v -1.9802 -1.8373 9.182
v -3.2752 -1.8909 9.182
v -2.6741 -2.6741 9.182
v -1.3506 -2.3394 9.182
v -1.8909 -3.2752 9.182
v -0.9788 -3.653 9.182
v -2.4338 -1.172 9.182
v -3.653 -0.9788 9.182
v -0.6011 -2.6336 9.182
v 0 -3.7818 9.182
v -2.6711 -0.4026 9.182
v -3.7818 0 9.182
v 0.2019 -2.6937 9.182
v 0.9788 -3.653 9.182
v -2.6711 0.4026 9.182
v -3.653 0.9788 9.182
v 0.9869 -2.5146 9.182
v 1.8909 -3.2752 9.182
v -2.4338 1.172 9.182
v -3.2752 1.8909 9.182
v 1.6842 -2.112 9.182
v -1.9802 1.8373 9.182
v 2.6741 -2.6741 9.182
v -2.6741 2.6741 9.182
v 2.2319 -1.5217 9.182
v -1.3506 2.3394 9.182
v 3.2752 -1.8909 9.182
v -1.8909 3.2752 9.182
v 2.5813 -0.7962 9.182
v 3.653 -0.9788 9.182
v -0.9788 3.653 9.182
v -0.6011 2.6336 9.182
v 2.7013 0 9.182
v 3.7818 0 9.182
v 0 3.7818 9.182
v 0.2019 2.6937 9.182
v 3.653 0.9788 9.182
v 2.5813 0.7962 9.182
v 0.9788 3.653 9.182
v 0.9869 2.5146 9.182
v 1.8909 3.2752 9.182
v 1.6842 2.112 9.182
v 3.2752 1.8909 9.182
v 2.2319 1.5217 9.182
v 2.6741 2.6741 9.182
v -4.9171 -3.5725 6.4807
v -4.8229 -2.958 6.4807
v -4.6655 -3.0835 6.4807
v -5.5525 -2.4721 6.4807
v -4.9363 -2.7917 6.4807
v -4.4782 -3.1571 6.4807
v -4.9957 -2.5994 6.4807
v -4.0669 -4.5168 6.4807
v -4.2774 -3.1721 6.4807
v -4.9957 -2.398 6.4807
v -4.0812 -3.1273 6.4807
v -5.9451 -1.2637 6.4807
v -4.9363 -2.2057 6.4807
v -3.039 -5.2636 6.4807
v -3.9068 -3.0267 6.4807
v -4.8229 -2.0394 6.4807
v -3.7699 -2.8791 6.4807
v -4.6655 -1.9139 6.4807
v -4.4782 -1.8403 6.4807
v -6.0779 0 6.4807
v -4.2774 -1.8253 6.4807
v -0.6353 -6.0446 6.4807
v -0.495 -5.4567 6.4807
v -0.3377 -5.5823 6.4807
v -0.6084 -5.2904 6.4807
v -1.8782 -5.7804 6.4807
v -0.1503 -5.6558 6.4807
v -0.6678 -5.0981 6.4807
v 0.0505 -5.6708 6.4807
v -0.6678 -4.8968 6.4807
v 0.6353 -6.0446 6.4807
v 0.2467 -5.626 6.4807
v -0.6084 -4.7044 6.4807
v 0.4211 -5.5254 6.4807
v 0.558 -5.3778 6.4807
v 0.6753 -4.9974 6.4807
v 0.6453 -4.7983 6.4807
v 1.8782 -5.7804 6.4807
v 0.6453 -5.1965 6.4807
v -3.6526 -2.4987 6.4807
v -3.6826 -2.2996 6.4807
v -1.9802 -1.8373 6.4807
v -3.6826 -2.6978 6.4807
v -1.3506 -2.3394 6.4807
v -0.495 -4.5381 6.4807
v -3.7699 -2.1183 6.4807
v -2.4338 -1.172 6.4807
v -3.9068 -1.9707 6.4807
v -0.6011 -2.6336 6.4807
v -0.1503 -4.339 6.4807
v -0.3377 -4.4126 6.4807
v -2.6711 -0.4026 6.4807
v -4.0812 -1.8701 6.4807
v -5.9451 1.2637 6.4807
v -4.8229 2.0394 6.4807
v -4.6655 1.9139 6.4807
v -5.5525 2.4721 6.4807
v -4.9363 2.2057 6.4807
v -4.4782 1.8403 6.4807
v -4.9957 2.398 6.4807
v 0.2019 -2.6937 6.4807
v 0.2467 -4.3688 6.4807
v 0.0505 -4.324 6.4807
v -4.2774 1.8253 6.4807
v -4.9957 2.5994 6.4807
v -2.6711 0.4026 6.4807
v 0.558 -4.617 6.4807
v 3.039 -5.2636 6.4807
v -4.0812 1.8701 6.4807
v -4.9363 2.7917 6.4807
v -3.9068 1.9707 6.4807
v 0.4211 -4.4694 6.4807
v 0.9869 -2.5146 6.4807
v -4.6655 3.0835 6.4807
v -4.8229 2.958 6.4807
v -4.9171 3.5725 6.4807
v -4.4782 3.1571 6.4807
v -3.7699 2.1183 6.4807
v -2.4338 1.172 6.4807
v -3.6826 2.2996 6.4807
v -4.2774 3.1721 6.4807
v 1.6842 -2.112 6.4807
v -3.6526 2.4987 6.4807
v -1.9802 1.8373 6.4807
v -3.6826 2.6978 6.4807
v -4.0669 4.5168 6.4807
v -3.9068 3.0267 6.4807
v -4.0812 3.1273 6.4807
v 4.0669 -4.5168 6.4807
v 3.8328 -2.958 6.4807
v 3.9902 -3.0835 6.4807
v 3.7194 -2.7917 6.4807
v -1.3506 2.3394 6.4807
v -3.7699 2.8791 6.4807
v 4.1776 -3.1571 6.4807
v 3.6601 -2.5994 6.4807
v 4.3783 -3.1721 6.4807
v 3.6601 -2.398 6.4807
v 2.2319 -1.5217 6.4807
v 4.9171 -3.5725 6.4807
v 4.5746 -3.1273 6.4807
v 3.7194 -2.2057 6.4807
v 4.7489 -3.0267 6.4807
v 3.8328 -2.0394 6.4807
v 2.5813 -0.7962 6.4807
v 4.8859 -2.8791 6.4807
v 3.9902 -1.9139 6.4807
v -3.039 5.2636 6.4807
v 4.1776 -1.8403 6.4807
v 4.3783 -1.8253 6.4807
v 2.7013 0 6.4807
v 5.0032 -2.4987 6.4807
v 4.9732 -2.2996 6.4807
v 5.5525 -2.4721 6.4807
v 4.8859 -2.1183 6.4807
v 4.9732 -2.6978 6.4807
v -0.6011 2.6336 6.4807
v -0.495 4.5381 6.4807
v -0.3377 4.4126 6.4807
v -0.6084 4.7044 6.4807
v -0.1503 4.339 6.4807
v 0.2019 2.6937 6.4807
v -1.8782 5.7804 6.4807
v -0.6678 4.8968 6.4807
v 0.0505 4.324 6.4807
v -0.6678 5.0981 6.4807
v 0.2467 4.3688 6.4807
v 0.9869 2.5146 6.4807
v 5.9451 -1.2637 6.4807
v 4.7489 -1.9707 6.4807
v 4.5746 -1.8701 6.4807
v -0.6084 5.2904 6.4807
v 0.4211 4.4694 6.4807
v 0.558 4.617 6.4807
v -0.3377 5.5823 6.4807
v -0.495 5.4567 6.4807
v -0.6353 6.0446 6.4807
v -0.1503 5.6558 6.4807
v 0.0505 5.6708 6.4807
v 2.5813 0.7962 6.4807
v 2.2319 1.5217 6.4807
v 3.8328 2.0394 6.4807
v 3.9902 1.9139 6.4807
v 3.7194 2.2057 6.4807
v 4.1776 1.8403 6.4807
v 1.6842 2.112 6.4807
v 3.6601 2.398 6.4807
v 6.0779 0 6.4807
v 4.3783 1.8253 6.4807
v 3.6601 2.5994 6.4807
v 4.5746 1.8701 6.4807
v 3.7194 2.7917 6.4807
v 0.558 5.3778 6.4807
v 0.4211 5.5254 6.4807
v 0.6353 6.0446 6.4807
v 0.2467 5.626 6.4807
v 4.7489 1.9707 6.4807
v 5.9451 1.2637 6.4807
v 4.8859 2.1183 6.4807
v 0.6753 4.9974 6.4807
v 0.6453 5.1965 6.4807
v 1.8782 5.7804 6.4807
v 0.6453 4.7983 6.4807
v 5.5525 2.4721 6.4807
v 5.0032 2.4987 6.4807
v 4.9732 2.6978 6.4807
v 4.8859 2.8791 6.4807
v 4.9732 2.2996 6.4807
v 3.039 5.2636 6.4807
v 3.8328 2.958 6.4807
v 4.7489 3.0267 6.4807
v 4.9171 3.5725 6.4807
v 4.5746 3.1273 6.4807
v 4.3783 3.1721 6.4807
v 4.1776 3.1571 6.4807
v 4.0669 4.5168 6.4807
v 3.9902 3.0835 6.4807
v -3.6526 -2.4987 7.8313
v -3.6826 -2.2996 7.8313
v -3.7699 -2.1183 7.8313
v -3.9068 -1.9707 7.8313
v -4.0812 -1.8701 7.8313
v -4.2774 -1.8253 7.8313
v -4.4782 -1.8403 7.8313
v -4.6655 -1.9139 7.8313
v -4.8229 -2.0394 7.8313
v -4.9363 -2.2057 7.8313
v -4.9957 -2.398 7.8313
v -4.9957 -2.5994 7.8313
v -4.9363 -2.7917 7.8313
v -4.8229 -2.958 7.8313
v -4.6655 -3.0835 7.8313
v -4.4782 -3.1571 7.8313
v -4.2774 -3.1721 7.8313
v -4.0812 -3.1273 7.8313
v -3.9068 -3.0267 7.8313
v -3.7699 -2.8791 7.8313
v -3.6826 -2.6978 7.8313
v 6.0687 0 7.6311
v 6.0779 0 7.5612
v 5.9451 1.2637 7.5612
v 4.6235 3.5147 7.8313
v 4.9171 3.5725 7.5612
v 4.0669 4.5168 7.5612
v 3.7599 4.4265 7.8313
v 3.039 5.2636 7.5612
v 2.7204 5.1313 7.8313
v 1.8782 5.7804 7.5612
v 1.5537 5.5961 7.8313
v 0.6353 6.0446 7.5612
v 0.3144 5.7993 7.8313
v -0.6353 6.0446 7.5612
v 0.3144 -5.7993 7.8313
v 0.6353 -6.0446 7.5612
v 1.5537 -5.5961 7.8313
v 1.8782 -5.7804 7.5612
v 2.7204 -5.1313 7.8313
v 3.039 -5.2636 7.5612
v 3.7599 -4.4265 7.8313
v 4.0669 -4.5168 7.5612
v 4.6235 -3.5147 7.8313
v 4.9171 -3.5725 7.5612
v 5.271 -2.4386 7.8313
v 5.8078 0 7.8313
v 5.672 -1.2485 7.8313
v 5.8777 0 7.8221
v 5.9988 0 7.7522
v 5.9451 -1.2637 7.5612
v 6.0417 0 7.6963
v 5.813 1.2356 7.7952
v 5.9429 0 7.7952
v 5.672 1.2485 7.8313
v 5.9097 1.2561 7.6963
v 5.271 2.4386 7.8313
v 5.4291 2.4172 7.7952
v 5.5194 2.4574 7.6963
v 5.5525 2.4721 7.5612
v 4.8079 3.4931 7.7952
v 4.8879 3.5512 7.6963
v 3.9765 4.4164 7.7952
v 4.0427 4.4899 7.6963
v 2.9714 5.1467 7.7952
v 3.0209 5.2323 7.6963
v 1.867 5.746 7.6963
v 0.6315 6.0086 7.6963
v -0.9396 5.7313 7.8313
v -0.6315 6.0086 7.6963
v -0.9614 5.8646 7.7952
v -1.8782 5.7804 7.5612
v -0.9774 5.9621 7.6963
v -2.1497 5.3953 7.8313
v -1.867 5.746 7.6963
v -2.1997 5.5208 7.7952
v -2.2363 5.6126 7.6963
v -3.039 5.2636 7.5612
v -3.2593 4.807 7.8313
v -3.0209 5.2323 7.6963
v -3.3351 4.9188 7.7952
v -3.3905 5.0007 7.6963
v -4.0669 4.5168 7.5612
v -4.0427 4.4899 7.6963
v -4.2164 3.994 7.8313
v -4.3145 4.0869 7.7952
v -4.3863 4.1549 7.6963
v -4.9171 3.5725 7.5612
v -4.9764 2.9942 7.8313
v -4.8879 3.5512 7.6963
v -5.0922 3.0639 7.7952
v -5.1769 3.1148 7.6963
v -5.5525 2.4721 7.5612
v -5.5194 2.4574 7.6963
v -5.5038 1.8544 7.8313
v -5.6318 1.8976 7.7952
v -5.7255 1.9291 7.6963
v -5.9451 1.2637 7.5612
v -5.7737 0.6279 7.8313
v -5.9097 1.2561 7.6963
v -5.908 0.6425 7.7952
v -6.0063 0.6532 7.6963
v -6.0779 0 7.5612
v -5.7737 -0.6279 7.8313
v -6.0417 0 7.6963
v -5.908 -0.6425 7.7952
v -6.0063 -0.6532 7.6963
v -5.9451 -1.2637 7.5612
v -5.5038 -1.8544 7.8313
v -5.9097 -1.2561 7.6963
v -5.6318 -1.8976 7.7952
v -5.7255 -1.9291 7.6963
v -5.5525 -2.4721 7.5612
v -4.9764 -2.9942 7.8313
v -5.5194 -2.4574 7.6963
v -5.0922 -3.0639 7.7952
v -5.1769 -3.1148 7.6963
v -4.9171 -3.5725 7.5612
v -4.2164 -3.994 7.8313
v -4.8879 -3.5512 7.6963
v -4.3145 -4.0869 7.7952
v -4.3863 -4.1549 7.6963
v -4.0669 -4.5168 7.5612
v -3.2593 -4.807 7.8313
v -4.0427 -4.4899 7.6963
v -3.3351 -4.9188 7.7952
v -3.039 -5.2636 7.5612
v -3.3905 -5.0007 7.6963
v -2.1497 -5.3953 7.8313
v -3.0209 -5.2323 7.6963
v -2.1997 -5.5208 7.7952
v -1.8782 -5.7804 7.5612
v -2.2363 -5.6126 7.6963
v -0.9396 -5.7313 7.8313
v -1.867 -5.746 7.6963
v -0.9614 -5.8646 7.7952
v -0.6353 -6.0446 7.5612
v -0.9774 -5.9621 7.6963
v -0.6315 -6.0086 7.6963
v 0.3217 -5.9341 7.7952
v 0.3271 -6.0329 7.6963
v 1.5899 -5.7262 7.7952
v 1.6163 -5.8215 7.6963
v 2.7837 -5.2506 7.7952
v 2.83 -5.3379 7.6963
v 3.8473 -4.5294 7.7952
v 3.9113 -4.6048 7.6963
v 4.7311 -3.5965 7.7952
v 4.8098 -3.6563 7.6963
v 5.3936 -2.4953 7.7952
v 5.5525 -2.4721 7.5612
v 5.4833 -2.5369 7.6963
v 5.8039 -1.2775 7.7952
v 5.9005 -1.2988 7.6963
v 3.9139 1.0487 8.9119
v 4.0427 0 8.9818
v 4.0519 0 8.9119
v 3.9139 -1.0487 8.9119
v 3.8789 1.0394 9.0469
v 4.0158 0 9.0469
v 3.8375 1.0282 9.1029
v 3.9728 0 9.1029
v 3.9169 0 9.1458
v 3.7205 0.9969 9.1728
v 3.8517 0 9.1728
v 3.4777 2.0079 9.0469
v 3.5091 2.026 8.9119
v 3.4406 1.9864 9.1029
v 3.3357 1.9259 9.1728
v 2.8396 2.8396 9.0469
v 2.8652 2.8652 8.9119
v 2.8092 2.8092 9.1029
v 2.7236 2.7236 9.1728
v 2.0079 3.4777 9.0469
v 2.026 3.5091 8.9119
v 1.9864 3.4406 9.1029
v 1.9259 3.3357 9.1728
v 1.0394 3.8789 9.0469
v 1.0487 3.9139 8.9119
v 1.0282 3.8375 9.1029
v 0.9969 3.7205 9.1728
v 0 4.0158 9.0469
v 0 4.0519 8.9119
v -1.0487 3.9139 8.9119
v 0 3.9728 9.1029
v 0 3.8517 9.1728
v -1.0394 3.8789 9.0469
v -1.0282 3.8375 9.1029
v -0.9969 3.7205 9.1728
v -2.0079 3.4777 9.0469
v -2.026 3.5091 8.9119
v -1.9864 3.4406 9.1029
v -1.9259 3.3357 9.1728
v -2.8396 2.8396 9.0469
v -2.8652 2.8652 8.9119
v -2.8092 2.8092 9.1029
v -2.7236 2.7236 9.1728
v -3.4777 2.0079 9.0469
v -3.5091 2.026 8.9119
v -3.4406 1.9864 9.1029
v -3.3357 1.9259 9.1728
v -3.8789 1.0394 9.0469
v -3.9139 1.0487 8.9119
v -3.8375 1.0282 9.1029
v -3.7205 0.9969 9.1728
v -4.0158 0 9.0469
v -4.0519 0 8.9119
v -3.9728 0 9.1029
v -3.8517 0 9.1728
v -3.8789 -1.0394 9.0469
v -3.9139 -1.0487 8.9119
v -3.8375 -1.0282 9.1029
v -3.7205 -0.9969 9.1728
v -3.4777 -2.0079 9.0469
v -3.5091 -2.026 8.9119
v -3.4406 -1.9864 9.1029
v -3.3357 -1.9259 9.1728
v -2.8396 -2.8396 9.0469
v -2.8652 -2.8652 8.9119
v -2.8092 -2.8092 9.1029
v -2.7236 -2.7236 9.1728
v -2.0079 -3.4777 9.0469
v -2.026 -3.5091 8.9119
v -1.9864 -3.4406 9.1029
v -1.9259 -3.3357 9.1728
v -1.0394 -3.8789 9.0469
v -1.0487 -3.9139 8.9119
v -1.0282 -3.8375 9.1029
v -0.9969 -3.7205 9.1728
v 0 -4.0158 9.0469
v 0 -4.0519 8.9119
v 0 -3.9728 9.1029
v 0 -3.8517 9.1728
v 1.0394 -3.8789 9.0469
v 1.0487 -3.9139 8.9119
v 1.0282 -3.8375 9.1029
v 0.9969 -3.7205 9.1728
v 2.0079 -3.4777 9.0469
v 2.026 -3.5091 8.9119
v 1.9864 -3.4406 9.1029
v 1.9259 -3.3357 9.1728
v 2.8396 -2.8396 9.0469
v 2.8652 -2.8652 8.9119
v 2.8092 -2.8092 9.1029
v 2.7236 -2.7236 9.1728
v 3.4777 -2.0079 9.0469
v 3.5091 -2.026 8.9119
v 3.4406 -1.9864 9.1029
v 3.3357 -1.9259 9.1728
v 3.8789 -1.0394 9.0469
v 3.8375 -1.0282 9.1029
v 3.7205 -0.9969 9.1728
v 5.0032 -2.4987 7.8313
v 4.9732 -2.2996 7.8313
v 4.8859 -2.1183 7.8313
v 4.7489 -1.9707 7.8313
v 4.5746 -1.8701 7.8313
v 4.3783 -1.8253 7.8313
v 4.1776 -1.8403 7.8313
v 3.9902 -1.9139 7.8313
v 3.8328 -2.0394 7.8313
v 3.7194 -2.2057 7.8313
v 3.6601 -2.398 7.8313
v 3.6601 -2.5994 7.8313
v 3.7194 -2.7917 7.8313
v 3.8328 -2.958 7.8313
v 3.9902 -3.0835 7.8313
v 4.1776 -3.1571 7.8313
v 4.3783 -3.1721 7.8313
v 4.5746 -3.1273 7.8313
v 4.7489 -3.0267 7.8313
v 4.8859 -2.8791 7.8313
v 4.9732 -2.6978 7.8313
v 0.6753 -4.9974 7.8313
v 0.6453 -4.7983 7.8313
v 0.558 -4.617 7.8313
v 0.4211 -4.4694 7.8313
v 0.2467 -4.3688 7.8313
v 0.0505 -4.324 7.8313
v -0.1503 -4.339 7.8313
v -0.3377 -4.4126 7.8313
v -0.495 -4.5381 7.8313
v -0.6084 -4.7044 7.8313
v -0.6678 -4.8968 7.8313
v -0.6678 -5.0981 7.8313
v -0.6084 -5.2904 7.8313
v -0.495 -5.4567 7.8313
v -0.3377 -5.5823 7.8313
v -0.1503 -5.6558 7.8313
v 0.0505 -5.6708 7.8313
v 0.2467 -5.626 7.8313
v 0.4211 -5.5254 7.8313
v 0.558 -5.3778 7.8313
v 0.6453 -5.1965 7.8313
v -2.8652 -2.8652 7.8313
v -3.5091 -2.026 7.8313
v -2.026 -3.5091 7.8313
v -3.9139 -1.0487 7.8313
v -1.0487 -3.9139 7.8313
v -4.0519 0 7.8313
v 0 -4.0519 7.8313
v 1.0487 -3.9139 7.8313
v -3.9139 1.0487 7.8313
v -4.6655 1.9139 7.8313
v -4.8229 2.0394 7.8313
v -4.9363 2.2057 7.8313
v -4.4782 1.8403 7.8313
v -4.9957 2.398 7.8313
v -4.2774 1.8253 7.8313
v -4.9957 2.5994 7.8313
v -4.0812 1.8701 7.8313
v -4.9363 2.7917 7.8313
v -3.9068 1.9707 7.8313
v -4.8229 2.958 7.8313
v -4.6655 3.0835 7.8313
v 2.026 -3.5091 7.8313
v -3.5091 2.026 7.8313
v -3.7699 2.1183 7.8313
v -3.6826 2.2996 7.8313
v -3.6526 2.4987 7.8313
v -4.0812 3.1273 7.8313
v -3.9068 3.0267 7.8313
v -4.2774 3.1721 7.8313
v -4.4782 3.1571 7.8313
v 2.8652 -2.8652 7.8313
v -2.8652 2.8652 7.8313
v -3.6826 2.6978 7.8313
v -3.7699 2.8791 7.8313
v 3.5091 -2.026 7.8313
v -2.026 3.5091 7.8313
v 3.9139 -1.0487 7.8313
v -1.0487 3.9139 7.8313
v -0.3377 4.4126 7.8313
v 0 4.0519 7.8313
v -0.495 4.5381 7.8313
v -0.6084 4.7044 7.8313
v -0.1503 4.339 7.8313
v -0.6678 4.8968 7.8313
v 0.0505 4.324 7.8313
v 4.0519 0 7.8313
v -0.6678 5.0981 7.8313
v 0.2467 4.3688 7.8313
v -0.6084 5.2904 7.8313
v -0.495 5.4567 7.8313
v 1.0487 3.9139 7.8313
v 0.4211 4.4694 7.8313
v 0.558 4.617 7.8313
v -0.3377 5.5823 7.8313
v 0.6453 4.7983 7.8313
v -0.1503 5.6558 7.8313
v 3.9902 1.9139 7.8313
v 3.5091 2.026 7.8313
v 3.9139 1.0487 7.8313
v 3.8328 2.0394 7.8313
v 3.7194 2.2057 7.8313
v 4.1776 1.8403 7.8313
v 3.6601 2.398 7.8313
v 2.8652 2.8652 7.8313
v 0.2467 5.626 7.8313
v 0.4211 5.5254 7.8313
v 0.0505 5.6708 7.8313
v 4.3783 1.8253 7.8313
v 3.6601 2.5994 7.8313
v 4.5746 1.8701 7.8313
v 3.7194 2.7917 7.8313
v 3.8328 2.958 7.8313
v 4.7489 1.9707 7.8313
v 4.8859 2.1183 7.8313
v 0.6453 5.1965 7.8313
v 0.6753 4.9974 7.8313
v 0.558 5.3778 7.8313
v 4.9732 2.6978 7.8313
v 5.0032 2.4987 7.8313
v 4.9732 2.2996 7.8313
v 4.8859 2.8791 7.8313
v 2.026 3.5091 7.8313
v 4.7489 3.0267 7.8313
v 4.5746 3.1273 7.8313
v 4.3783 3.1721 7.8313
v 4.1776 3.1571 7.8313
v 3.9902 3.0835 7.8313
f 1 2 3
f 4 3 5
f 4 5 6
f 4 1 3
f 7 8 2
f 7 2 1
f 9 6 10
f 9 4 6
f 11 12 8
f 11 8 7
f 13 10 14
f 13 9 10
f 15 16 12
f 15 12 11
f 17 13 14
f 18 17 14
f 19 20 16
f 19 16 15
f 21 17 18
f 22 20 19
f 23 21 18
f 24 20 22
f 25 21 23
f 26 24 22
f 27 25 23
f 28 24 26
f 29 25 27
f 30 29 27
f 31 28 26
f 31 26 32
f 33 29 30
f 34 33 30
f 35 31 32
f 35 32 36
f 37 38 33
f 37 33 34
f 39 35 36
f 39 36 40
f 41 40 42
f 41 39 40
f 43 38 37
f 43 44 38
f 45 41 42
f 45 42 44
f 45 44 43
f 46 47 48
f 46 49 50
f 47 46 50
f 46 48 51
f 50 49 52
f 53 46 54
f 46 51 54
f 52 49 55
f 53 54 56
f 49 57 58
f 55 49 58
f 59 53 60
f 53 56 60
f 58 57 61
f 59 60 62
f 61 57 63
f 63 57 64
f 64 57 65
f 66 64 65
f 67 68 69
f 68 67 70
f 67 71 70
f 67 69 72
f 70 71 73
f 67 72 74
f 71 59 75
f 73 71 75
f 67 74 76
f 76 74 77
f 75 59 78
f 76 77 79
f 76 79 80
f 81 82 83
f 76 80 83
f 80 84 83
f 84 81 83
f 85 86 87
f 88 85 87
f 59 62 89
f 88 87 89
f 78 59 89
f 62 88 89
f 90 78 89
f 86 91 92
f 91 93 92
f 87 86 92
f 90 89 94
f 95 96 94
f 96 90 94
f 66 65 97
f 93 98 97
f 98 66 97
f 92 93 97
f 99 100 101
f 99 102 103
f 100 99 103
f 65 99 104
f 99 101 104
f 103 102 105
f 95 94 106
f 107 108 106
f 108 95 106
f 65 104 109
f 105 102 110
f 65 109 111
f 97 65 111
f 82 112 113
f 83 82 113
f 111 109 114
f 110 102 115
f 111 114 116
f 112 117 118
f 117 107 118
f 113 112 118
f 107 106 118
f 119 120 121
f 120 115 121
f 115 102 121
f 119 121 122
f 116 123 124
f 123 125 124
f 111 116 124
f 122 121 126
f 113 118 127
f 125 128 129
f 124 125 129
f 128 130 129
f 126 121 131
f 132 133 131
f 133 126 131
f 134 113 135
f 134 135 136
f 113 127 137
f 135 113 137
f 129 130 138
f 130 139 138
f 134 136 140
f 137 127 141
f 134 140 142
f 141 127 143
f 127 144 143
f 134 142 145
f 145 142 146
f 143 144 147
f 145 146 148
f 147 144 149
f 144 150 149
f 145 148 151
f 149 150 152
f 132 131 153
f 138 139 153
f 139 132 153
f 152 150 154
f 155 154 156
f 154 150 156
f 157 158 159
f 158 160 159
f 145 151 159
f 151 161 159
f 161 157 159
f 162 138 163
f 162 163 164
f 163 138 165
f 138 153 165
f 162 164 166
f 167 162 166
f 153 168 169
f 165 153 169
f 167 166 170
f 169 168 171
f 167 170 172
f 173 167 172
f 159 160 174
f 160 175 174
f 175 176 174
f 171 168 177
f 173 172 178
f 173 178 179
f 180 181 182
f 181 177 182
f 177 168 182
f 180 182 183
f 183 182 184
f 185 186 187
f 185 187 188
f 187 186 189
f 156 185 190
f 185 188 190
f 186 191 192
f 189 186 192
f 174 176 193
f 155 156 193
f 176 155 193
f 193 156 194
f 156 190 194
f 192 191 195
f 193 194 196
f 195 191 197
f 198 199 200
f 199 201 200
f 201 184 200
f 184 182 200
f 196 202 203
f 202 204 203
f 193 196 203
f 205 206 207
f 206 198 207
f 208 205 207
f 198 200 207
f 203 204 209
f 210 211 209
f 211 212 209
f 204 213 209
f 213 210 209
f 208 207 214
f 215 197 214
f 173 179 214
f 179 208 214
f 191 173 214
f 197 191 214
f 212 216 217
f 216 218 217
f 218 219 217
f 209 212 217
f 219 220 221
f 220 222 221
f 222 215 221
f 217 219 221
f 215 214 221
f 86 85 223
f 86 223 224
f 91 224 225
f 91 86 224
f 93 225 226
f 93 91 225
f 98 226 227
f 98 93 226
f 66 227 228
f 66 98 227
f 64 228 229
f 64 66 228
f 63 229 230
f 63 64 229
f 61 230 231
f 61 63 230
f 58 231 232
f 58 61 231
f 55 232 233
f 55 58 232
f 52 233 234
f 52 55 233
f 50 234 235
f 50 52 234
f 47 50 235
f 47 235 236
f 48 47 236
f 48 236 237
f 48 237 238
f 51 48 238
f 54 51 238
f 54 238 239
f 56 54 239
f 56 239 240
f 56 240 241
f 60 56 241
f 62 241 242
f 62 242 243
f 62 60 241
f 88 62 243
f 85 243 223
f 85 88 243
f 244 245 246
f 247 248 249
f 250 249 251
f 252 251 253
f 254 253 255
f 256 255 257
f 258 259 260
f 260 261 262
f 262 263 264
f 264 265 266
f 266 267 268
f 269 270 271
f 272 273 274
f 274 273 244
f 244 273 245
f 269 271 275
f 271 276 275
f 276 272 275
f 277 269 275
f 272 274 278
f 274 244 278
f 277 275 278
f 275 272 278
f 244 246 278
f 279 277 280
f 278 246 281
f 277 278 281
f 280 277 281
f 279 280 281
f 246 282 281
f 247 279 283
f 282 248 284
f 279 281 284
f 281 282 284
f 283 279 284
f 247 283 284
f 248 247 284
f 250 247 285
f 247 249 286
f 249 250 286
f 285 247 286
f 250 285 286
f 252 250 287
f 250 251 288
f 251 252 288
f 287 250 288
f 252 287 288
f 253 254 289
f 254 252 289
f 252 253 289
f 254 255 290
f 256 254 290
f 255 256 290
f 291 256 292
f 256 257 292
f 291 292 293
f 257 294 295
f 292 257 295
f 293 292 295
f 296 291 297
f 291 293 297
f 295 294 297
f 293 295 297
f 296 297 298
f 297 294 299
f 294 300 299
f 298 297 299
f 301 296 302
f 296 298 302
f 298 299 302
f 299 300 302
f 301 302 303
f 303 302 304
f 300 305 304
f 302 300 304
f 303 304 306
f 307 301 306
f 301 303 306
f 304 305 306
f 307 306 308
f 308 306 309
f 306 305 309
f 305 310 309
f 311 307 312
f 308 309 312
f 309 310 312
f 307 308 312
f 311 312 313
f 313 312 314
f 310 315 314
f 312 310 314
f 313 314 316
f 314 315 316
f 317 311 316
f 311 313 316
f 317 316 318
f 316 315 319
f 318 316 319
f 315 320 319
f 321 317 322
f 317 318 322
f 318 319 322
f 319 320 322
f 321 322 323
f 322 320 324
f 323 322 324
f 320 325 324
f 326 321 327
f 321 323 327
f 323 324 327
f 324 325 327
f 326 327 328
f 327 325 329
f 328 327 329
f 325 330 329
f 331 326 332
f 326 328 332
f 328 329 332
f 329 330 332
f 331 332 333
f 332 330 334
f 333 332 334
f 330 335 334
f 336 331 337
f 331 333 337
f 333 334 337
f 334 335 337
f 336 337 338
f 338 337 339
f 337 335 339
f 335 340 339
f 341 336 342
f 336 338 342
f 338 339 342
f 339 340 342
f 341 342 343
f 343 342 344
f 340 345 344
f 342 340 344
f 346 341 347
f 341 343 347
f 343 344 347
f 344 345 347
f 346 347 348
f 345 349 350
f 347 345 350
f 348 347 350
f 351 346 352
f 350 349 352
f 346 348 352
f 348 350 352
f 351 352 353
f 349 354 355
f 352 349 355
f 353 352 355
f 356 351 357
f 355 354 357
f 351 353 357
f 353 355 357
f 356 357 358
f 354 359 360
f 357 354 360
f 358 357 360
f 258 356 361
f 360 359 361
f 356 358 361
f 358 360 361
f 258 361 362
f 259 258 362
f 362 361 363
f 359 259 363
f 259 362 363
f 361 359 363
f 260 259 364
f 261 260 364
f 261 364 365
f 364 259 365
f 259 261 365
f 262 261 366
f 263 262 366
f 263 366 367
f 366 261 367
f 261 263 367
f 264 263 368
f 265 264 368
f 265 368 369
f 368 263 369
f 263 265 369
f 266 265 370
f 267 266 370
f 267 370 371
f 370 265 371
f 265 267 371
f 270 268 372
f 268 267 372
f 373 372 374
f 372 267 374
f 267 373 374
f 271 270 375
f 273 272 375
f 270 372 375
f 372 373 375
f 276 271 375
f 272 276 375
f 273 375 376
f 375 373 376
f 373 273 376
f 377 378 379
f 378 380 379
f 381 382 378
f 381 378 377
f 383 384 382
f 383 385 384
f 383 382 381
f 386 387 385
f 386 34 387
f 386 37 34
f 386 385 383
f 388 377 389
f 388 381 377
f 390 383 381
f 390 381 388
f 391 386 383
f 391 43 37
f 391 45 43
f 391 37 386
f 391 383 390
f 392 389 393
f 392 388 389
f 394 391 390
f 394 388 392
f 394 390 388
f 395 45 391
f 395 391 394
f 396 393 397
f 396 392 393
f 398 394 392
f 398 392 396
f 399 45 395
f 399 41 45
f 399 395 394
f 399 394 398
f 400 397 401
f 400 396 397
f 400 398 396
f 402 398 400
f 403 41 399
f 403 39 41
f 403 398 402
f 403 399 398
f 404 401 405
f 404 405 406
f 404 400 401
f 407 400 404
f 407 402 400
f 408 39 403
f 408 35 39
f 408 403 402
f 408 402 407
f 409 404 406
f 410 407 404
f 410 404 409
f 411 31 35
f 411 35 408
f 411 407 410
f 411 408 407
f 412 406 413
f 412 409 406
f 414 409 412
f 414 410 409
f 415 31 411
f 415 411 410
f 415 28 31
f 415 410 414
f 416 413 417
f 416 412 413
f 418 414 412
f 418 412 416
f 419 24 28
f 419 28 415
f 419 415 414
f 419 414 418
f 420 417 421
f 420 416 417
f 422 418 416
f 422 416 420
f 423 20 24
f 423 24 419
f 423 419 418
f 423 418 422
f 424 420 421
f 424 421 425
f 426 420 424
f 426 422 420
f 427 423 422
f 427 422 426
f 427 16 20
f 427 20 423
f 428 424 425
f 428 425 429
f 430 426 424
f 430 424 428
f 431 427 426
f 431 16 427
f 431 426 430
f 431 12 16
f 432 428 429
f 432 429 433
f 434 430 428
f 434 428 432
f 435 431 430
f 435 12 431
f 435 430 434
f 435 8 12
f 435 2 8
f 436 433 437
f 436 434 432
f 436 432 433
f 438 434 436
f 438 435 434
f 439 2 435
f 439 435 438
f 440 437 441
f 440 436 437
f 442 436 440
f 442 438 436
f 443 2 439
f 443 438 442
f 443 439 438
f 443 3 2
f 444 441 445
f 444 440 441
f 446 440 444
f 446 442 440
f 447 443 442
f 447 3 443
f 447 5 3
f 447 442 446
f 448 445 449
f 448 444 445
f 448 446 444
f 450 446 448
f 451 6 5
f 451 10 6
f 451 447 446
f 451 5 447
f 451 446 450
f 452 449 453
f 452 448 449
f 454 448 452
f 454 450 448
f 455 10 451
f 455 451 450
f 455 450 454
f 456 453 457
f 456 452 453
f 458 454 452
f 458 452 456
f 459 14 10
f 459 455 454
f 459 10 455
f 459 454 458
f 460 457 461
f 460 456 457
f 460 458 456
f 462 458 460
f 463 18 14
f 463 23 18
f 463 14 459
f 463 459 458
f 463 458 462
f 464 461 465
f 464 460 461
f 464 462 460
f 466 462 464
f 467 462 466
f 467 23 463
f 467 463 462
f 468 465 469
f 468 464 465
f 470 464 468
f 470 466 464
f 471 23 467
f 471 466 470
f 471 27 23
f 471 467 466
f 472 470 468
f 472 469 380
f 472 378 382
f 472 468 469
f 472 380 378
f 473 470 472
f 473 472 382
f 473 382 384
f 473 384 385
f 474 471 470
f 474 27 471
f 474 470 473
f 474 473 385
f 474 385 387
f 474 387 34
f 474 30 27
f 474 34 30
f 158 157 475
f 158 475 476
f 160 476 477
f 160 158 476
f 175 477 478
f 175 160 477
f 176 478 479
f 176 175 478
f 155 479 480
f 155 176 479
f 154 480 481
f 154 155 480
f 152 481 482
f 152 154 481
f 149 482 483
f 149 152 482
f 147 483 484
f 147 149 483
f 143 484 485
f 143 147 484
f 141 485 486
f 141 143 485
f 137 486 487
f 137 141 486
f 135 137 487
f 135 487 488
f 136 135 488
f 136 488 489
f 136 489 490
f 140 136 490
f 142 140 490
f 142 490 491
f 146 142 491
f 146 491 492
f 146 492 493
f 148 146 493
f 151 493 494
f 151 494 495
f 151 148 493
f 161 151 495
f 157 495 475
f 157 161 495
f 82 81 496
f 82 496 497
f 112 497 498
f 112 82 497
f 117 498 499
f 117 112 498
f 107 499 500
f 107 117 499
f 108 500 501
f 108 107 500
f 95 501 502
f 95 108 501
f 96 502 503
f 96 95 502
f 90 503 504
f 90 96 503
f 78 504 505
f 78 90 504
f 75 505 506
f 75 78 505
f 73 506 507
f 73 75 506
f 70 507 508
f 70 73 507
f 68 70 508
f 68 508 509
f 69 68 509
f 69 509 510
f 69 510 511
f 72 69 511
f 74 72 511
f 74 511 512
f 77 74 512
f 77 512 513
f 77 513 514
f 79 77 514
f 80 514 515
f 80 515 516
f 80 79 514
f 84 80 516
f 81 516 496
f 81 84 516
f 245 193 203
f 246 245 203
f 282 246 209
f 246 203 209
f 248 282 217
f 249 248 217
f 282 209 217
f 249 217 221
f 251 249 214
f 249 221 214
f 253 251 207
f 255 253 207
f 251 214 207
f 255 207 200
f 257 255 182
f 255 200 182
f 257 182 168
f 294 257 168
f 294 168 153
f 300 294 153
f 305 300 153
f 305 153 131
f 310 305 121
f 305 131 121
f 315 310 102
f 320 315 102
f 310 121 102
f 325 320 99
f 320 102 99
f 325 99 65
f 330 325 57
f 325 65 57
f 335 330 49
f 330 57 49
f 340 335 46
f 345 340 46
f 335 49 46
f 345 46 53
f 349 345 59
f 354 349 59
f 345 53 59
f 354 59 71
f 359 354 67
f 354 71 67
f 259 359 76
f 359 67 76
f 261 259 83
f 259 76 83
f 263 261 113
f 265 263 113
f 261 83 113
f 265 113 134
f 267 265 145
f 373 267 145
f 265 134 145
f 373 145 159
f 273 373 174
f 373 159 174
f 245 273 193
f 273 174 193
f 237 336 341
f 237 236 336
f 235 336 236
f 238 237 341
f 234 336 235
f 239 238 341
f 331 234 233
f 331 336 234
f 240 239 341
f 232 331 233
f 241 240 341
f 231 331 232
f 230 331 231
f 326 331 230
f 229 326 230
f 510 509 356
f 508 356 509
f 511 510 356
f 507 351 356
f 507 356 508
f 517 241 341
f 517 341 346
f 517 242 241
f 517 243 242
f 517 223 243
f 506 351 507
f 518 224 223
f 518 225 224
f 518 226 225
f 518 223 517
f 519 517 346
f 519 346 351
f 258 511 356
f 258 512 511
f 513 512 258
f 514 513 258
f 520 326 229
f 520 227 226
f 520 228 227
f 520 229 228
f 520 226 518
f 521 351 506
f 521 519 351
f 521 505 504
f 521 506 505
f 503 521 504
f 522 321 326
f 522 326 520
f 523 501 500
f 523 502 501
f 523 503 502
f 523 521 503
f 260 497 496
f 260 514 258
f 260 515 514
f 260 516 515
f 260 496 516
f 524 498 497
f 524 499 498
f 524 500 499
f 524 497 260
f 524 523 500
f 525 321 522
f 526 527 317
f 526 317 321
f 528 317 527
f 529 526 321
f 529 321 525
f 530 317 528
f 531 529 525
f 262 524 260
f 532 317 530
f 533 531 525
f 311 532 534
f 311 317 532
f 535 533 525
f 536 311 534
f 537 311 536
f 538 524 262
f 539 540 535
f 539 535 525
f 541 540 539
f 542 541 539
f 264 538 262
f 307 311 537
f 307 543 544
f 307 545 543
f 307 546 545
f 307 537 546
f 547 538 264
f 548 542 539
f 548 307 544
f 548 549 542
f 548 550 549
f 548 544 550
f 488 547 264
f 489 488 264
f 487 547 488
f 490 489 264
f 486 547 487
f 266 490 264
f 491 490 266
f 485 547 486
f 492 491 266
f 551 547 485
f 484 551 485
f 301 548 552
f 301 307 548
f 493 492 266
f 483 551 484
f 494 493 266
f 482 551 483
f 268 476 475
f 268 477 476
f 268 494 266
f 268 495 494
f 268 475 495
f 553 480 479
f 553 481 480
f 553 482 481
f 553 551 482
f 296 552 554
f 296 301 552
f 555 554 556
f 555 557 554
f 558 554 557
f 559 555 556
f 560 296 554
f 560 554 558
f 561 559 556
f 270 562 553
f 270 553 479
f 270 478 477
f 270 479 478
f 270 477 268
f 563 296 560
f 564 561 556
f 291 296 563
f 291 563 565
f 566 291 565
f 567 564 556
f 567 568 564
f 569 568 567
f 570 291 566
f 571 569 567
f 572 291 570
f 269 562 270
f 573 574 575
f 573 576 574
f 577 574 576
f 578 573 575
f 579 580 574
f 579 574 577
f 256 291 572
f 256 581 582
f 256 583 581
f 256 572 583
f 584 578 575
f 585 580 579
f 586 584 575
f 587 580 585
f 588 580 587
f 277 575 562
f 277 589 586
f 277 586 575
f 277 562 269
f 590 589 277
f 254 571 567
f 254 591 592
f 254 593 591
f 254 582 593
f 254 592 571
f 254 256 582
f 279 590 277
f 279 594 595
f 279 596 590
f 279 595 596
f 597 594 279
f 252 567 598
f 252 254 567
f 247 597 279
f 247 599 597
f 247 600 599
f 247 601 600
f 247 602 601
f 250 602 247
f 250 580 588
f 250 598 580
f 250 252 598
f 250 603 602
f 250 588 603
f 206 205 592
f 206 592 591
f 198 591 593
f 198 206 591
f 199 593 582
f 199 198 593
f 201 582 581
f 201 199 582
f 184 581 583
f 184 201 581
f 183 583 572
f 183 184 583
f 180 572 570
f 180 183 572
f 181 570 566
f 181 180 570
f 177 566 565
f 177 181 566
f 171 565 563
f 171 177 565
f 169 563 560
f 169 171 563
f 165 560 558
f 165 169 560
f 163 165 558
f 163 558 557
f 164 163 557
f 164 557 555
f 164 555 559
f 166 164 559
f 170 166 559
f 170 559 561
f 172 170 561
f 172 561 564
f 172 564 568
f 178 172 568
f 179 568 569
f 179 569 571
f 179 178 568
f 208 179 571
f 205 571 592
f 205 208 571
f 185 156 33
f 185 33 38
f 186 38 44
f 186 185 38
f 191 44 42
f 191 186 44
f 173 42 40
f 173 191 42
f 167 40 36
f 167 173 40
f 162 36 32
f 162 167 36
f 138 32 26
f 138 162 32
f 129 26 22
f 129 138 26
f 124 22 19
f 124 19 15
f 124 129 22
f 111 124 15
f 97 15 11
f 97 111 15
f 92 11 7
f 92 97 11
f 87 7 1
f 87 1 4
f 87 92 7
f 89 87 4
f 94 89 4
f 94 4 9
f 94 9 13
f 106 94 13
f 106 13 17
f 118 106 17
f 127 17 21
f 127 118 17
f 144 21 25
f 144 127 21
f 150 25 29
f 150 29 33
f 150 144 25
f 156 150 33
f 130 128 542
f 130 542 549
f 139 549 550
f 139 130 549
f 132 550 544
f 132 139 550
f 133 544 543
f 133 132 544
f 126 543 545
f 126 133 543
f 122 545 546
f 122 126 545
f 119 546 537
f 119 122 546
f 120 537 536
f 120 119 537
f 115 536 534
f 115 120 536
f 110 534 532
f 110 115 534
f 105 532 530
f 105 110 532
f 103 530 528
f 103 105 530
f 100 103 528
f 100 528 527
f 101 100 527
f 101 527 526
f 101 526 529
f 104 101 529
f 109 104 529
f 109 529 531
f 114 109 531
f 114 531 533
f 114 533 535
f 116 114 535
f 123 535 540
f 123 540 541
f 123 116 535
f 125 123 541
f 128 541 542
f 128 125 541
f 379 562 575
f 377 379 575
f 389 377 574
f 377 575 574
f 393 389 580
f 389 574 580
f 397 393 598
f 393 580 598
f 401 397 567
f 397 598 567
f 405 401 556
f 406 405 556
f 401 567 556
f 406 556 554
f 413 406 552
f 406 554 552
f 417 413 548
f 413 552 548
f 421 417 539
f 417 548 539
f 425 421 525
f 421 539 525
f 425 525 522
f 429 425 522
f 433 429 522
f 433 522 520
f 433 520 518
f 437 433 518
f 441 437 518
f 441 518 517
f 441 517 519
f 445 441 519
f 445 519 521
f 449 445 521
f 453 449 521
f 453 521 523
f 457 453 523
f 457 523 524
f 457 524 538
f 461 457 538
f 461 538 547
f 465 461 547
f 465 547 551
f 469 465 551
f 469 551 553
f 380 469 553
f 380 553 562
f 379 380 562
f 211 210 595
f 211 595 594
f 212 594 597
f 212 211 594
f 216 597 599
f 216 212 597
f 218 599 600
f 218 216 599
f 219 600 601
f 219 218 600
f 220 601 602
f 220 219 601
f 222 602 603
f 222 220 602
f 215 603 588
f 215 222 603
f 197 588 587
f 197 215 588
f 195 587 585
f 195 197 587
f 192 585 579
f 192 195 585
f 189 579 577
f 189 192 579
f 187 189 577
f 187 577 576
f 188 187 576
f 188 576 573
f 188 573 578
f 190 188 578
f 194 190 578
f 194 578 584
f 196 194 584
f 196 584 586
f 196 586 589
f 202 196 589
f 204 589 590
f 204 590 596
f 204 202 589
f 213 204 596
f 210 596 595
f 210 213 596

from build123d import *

# Parameters (mm, degrees)
SKETCH1_R           = 45
SKETCH1_R_2         = 5
SKETCH1_R_3         = 30
BOSS_EXTRUDE1_DEPTH = 10
SKETCH1_3_R         = 30
SKETCH1_3_R_2       = 20
BOSS_EXTRUDE2_DEPTH = 20
FILLET1_R           = 2
SCALE_1_SCALE       = 0.135064935


with BuildPart() as part:
    # Sketch1 → Boss-Extrude1 (new body)
    with BuildSketch(Plane.XY):
        Circle(SKETCH1_R)
        with Locations((0, -37)):
            Circle(SKETCH1_R_2, mode=Mode.SUBTRACT)
        with Locations((-32.04293994, -18.5)):
            Circle(SKETCH1_R_2, mode=Mode.SUBTRACT)
        with Locations((32.04293994, -18.5)):
            Circle(SKETCH1_R_2, mode=Mode.SUBTRACT)
        with Locations((-32.04293994, 18.5)):
            Circle(SKETCH1_R_2, mode=Mode.SUBTRACT)
        Circle(SKETCH1_R_3, mode=Mode.SUBTRACT)
        with Locations((32.04293994, 18.5)):
            Circle(SKETCH1_R_2, mode=Mode.SUBTRACT)
        with Locations((0, 37)):
            Circle(SKETCH1_R_2, mode=Mode.SUBTRACT)
    extrude(amount=BOSS_EXTRUDE1_DEPTH)

    # Sketch1<3> → Boss-Extrude2 (add)
    with BuildSketch(Plane.XY):
        Circle(SKETCH1_3_R)
        Circle(SKETCH1_3_R_2, mode=Mode.SUBTRACT)
    extrude(amount=BOSS_EXTRUDE2_DEPTH)

    # Fillet1
    fillet1_edges = [part.edges().sort_by_distance(p)[0] for p in [
        (-45, 0, 10),
        (-30, 0, 20),
    ]]
    fillet(fillet1_edges, radius=FILLET1_R)


with BuildPart() as part_1:
    # 缩放比例1: scaled about (0, 0, 7.492696154)
    add(part.part.scale(SCALE_1_SCALE).moved(Location((0, 0, 6.480695634))))


solid = part_1.part
